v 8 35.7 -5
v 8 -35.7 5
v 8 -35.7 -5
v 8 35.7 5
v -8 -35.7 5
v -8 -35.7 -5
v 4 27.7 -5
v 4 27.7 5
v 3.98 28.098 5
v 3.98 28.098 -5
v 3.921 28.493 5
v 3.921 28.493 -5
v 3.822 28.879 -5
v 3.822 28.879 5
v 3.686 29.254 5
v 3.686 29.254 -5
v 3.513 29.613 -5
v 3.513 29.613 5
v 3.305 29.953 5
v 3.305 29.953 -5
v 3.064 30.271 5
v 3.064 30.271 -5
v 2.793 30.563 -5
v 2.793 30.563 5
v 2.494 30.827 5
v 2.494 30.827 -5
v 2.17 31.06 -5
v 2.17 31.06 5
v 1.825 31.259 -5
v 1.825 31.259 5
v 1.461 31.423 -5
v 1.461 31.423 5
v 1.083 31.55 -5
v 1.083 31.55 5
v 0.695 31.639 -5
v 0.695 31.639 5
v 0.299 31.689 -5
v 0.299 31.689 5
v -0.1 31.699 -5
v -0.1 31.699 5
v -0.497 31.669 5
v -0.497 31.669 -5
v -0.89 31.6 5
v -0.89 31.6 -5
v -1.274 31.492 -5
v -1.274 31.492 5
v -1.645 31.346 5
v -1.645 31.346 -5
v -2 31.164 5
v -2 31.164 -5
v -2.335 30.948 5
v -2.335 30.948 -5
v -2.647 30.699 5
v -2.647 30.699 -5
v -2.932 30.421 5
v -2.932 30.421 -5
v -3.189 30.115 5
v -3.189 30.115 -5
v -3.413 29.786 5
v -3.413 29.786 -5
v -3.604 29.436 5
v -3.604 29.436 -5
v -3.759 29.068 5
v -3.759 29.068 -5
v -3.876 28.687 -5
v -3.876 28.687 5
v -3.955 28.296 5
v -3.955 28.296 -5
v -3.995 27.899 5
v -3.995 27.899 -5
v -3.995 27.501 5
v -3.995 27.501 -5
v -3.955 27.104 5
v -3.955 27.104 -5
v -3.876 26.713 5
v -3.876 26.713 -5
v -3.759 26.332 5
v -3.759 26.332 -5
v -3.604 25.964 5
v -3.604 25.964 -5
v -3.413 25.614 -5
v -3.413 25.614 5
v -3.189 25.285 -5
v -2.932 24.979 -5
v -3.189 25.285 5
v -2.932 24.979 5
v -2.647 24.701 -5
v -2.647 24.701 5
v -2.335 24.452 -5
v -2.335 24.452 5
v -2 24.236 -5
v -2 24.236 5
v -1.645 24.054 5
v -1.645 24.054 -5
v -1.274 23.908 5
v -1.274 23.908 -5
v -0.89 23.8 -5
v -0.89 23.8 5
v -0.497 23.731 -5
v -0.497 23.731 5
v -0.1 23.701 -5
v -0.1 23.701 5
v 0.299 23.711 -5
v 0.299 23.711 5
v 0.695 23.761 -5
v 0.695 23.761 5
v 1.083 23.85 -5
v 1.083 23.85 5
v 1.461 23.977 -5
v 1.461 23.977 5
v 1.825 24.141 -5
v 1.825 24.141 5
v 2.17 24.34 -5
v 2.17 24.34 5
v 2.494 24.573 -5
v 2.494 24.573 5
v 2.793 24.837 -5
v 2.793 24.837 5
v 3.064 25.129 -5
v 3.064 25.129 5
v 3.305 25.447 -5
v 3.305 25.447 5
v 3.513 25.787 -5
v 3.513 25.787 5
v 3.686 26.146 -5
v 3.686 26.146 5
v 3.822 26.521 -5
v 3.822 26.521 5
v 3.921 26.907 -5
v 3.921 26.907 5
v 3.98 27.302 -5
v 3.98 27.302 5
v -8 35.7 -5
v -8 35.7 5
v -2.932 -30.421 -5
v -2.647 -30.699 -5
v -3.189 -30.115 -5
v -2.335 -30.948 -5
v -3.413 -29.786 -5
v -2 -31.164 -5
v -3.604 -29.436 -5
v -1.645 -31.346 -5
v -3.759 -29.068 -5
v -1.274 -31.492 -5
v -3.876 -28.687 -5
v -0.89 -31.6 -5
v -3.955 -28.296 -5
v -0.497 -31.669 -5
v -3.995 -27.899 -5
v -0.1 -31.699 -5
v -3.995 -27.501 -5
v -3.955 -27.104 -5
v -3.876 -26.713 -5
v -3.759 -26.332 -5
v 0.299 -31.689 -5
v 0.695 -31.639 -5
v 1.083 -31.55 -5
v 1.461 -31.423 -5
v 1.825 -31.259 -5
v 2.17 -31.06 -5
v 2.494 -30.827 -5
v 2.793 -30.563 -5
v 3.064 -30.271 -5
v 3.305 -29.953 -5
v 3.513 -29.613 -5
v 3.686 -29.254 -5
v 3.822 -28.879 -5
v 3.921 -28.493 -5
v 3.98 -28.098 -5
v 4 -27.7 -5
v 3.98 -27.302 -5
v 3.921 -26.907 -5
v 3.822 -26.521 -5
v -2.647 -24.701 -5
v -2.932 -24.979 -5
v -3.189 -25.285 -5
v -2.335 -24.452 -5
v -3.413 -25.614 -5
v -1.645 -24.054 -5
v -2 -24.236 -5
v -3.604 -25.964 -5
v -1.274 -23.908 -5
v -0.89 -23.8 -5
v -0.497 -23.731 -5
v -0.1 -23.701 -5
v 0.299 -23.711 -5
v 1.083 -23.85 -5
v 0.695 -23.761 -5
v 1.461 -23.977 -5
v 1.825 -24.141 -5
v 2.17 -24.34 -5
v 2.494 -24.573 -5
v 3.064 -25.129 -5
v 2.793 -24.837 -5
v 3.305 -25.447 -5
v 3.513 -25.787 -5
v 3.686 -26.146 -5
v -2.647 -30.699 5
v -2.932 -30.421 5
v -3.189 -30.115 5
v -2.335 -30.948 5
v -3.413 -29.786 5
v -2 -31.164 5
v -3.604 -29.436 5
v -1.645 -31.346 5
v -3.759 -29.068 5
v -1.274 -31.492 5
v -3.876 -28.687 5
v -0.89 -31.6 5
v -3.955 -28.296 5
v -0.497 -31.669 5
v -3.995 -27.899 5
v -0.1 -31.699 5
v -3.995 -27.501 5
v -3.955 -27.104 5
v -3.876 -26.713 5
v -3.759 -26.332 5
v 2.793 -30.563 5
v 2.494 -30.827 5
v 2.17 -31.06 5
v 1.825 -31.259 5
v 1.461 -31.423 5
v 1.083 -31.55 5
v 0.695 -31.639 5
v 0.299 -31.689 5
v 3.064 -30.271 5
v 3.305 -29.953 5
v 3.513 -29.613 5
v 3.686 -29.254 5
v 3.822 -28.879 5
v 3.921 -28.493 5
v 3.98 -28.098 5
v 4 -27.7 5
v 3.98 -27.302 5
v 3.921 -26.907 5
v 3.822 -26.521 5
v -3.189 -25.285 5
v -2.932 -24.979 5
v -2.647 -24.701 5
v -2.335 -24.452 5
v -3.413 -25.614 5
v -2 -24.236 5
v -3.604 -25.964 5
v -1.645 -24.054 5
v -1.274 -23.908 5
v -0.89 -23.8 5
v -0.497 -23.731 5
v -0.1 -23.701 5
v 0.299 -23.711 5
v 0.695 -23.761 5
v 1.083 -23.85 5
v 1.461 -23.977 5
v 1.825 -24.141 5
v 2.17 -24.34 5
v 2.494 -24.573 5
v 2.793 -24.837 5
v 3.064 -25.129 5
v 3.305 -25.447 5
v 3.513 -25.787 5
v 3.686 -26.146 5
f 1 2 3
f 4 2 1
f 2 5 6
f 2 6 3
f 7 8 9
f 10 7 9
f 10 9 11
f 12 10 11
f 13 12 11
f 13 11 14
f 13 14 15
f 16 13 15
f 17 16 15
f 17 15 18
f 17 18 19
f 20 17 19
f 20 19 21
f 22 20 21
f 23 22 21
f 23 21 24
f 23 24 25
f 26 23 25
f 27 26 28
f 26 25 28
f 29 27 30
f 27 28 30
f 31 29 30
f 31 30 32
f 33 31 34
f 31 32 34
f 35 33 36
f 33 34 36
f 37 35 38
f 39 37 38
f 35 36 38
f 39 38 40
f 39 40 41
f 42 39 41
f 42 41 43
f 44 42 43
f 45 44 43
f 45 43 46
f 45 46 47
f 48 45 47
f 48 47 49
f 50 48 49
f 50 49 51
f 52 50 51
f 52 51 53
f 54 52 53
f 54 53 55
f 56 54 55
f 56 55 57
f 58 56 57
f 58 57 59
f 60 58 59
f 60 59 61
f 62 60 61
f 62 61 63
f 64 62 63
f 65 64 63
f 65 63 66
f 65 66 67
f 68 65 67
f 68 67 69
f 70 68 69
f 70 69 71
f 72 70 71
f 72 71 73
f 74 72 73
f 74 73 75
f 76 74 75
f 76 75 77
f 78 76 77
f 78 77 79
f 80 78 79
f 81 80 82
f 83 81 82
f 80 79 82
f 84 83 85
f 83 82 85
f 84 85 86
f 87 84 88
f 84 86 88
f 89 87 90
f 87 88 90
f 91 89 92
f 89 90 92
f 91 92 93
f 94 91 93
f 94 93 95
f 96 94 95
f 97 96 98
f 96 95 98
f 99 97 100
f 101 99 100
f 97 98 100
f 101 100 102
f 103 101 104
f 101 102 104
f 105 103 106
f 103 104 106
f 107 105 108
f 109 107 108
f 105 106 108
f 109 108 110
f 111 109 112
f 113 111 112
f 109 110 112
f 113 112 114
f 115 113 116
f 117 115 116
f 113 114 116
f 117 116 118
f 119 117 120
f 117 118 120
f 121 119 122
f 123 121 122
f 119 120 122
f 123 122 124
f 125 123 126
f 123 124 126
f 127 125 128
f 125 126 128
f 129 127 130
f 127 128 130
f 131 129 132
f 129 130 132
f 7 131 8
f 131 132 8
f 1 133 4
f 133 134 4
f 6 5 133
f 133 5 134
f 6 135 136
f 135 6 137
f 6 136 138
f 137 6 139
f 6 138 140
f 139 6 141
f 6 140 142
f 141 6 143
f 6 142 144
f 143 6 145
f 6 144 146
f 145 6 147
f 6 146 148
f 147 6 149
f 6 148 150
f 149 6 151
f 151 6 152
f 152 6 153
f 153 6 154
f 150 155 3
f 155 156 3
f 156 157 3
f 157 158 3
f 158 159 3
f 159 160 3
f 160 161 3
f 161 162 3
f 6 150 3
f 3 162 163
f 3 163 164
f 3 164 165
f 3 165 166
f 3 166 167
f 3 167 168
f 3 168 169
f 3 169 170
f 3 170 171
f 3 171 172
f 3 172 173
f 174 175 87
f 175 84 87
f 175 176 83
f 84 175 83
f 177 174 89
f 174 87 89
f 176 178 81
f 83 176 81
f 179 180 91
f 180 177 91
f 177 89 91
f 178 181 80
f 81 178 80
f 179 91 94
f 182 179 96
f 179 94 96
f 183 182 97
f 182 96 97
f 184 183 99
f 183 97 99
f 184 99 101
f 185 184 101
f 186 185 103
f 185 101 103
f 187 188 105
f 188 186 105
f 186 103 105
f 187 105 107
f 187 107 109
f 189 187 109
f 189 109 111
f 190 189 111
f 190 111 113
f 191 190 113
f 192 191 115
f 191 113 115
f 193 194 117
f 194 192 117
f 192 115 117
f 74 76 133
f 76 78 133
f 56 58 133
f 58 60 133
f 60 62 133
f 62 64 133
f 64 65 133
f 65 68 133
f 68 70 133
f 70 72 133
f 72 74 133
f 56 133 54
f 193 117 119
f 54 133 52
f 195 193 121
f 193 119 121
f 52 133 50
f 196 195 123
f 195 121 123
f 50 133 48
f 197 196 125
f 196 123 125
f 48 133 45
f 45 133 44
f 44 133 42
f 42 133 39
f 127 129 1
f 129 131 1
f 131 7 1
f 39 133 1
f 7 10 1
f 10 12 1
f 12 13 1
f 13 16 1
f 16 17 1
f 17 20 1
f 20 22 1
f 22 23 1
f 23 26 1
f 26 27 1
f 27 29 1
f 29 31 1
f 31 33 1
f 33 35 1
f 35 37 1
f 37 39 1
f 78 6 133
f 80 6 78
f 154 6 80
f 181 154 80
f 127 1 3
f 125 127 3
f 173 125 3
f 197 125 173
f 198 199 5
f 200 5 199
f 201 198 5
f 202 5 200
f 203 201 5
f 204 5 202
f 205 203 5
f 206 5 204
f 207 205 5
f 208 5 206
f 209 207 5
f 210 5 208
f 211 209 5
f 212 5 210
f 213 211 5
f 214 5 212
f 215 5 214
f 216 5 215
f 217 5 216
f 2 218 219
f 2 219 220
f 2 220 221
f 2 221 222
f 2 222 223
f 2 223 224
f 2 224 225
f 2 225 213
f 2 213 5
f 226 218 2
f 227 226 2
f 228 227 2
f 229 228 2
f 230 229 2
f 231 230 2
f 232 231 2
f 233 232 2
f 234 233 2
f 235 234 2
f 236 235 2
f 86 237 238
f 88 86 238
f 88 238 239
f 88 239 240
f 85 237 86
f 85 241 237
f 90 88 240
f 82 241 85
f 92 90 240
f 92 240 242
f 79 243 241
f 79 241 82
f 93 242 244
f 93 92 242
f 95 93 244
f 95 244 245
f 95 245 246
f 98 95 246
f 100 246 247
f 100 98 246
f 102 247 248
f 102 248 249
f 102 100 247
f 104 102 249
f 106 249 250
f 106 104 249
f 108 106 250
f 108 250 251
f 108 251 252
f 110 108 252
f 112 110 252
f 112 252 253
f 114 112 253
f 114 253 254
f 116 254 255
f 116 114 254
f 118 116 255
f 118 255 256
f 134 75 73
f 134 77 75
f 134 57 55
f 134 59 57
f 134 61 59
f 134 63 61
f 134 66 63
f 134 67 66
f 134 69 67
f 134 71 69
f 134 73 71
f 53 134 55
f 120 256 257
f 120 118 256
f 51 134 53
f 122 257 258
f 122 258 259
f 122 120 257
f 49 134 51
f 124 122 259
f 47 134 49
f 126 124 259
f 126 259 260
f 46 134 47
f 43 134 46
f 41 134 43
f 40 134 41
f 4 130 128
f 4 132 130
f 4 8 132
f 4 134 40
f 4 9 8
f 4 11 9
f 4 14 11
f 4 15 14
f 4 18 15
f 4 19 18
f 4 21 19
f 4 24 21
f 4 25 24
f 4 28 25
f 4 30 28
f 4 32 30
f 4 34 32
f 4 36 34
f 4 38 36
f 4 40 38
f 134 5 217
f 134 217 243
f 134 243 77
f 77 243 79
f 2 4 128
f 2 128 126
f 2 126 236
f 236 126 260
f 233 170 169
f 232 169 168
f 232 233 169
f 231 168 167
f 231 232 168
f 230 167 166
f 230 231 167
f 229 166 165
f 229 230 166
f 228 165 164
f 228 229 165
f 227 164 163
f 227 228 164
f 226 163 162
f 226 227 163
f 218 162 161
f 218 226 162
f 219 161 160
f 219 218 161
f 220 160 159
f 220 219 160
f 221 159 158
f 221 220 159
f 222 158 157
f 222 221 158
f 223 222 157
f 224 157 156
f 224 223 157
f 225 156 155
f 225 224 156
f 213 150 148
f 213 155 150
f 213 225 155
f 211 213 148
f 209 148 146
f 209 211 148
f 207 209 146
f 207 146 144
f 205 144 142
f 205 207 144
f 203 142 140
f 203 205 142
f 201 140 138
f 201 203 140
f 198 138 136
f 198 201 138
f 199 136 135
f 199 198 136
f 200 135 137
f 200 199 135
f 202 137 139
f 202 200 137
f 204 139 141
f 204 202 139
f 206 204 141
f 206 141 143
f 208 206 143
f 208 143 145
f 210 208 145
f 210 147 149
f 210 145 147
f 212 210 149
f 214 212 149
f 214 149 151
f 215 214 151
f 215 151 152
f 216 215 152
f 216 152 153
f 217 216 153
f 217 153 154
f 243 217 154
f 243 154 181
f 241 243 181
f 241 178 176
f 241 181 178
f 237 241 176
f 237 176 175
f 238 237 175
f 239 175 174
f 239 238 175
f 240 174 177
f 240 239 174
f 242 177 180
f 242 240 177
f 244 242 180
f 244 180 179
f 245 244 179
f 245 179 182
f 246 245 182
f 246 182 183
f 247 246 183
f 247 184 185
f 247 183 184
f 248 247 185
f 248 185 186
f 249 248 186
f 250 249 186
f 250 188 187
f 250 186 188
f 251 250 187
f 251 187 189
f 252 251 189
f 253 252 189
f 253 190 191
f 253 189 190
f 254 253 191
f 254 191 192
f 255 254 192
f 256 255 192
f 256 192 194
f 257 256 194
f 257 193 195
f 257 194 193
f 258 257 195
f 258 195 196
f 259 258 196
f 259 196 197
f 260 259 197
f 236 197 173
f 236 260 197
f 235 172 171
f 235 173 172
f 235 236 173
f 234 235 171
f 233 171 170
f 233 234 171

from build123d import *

# Parameters (mm, degrees)
SKETCH1_W      = 16
SKETCH1_H      = 71.4
BODY_DEPTH     = 5
SKETCH2_R      = 4
TOP_HOLE_DEPTH = 11


with BuildPart() as part:
    # Sketch1 → Body (new body, symmetric)
    with BuildSketch(Plane.XY):
        Rectangle(SKETCH1_W, SKETCH1_H)
    extrude(amount=BODY_DEPTH, both=True)

    # Sketch2 → Top Hole (cut, through all)
    with BuildSketch(Plane.XY.offset(5)):
        with Locations((0, 27.7)):
            Circle(SKETCH2_R)
    top_hole = extrude(amount=-TOP_HOLE_DEPTH, mode=Mode.SUBTRACT)

    # Bottom Hole: Top Hole across plane
    add(top_hole.mirror(Plane.ZX), mode=Mode.SUBTRACT)


solid = part.part
